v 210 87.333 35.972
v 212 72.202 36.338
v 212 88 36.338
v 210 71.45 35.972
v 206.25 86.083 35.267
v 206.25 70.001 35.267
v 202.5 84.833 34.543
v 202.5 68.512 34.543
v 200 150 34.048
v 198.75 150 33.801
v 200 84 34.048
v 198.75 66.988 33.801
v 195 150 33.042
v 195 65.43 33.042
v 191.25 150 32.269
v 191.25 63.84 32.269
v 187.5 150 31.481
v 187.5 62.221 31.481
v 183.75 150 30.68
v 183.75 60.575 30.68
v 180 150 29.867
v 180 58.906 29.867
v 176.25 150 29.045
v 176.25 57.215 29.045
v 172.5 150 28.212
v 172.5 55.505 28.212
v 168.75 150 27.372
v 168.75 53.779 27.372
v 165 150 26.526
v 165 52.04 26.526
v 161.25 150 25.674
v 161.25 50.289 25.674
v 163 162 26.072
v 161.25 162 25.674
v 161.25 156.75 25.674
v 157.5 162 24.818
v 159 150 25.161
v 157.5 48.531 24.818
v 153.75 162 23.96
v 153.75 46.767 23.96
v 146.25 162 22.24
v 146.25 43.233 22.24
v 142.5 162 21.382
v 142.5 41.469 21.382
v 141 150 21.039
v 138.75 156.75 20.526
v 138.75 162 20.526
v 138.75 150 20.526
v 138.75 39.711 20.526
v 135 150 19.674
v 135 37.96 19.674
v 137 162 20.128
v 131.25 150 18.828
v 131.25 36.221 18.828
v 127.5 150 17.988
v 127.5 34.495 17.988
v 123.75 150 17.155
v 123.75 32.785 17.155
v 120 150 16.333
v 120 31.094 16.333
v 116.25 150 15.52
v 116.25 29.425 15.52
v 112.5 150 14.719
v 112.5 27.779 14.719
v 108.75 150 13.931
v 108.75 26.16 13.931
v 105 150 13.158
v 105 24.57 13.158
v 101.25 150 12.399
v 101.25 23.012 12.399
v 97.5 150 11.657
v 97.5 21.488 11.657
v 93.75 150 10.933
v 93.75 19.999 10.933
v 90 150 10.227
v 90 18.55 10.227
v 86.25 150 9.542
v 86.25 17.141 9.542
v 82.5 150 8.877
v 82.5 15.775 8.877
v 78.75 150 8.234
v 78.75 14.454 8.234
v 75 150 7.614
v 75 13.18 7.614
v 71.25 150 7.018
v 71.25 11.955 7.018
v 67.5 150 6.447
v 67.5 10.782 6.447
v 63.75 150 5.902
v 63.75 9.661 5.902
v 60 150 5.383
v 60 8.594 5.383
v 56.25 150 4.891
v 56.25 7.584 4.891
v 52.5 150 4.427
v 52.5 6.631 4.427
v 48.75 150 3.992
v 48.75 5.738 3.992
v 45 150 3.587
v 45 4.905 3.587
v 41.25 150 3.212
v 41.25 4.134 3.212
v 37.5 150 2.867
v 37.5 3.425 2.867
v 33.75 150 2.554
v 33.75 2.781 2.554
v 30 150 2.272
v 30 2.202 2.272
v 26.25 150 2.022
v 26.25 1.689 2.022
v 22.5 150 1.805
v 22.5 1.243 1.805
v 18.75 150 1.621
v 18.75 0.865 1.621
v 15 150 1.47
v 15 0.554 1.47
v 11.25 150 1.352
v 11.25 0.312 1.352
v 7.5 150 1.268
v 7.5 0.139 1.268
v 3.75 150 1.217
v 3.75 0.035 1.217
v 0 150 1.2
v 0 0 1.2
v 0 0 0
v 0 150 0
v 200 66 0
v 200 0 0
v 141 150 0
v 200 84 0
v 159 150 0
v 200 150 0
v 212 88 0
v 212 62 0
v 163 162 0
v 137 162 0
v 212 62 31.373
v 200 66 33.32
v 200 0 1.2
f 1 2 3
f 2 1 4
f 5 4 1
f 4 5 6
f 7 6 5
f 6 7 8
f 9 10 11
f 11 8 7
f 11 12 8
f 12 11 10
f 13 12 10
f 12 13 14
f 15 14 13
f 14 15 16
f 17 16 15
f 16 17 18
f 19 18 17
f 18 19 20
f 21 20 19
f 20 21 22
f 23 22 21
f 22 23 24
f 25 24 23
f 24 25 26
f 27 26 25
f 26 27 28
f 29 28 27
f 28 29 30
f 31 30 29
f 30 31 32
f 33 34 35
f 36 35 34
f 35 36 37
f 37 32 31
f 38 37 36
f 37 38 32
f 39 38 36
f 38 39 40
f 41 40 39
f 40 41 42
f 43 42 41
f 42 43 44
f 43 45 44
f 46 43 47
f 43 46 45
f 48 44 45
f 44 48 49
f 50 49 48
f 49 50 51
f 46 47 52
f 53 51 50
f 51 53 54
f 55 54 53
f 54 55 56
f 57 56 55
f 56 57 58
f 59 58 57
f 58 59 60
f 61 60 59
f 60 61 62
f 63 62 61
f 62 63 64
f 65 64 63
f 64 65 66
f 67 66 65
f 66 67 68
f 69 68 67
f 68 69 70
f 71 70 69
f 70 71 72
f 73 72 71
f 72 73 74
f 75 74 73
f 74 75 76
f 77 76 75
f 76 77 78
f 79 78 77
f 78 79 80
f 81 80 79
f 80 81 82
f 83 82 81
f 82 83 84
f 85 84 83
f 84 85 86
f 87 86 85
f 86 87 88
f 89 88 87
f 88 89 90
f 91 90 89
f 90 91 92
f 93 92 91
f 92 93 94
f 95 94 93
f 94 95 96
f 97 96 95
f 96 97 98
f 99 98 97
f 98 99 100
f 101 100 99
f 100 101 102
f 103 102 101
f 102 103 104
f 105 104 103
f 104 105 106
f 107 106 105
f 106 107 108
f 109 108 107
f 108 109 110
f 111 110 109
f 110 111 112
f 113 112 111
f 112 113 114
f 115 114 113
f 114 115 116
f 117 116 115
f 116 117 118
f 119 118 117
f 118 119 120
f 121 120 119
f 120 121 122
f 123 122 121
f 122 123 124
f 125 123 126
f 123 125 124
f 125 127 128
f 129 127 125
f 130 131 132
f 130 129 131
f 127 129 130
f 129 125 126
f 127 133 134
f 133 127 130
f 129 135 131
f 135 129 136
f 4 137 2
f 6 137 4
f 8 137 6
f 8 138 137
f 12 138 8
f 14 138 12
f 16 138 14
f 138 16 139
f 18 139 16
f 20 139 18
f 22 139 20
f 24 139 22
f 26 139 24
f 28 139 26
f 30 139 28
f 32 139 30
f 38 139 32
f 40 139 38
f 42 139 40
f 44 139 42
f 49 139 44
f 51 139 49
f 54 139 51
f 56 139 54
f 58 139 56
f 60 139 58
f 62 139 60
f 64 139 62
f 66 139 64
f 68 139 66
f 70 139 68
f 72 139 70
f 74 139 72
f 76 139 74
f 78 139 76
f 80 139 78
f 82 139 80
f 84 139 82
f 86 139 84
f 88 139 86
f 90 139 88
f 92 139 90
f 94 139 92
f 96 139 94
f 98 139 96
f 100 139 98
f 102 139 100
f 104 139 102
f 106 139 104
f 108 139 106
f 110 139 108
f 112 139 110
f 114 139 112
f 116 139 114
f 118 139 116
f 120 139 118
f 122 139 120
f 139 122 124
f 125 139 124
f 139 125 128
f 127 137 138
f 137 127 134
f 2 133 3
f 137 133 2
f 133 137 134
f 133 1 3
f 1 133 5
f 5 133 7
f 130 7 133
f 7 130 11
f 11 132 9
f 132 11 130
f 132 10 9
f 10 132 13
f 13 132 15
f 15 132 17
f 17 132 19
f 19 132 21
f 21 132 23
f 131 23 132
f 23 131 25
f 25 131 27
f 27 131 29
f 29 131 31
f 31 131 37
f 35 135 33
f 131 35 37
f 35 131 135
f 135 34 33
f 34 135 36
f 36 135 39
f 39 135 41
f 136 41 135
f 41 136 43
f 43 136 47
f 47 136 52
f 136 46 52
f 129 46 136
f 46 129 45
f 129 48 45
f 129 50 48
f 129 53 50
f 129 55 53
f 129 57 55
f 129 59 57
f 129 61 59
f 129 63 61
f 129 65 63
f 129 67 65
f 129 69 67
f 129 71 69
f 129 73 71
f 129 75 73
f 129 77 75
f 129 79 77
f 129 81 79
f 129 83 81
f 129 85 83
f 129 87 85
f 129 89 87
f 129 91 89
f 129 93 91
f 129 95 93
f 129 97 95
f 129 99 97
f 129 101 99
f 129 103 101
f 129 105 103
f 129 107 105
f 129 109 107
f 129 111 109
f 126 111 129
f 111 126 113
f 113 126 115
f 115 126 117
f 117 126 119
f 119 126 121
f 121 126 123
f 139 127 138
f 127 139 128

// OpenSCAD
include <bikeramp.scad>
echo(str("SCAD_N=", len(decal_rects())));
echo(str("SCAD_SUM=", [for(r=decal_rects()) (r[2]-r[0])*(r[3]-r[1])]));
